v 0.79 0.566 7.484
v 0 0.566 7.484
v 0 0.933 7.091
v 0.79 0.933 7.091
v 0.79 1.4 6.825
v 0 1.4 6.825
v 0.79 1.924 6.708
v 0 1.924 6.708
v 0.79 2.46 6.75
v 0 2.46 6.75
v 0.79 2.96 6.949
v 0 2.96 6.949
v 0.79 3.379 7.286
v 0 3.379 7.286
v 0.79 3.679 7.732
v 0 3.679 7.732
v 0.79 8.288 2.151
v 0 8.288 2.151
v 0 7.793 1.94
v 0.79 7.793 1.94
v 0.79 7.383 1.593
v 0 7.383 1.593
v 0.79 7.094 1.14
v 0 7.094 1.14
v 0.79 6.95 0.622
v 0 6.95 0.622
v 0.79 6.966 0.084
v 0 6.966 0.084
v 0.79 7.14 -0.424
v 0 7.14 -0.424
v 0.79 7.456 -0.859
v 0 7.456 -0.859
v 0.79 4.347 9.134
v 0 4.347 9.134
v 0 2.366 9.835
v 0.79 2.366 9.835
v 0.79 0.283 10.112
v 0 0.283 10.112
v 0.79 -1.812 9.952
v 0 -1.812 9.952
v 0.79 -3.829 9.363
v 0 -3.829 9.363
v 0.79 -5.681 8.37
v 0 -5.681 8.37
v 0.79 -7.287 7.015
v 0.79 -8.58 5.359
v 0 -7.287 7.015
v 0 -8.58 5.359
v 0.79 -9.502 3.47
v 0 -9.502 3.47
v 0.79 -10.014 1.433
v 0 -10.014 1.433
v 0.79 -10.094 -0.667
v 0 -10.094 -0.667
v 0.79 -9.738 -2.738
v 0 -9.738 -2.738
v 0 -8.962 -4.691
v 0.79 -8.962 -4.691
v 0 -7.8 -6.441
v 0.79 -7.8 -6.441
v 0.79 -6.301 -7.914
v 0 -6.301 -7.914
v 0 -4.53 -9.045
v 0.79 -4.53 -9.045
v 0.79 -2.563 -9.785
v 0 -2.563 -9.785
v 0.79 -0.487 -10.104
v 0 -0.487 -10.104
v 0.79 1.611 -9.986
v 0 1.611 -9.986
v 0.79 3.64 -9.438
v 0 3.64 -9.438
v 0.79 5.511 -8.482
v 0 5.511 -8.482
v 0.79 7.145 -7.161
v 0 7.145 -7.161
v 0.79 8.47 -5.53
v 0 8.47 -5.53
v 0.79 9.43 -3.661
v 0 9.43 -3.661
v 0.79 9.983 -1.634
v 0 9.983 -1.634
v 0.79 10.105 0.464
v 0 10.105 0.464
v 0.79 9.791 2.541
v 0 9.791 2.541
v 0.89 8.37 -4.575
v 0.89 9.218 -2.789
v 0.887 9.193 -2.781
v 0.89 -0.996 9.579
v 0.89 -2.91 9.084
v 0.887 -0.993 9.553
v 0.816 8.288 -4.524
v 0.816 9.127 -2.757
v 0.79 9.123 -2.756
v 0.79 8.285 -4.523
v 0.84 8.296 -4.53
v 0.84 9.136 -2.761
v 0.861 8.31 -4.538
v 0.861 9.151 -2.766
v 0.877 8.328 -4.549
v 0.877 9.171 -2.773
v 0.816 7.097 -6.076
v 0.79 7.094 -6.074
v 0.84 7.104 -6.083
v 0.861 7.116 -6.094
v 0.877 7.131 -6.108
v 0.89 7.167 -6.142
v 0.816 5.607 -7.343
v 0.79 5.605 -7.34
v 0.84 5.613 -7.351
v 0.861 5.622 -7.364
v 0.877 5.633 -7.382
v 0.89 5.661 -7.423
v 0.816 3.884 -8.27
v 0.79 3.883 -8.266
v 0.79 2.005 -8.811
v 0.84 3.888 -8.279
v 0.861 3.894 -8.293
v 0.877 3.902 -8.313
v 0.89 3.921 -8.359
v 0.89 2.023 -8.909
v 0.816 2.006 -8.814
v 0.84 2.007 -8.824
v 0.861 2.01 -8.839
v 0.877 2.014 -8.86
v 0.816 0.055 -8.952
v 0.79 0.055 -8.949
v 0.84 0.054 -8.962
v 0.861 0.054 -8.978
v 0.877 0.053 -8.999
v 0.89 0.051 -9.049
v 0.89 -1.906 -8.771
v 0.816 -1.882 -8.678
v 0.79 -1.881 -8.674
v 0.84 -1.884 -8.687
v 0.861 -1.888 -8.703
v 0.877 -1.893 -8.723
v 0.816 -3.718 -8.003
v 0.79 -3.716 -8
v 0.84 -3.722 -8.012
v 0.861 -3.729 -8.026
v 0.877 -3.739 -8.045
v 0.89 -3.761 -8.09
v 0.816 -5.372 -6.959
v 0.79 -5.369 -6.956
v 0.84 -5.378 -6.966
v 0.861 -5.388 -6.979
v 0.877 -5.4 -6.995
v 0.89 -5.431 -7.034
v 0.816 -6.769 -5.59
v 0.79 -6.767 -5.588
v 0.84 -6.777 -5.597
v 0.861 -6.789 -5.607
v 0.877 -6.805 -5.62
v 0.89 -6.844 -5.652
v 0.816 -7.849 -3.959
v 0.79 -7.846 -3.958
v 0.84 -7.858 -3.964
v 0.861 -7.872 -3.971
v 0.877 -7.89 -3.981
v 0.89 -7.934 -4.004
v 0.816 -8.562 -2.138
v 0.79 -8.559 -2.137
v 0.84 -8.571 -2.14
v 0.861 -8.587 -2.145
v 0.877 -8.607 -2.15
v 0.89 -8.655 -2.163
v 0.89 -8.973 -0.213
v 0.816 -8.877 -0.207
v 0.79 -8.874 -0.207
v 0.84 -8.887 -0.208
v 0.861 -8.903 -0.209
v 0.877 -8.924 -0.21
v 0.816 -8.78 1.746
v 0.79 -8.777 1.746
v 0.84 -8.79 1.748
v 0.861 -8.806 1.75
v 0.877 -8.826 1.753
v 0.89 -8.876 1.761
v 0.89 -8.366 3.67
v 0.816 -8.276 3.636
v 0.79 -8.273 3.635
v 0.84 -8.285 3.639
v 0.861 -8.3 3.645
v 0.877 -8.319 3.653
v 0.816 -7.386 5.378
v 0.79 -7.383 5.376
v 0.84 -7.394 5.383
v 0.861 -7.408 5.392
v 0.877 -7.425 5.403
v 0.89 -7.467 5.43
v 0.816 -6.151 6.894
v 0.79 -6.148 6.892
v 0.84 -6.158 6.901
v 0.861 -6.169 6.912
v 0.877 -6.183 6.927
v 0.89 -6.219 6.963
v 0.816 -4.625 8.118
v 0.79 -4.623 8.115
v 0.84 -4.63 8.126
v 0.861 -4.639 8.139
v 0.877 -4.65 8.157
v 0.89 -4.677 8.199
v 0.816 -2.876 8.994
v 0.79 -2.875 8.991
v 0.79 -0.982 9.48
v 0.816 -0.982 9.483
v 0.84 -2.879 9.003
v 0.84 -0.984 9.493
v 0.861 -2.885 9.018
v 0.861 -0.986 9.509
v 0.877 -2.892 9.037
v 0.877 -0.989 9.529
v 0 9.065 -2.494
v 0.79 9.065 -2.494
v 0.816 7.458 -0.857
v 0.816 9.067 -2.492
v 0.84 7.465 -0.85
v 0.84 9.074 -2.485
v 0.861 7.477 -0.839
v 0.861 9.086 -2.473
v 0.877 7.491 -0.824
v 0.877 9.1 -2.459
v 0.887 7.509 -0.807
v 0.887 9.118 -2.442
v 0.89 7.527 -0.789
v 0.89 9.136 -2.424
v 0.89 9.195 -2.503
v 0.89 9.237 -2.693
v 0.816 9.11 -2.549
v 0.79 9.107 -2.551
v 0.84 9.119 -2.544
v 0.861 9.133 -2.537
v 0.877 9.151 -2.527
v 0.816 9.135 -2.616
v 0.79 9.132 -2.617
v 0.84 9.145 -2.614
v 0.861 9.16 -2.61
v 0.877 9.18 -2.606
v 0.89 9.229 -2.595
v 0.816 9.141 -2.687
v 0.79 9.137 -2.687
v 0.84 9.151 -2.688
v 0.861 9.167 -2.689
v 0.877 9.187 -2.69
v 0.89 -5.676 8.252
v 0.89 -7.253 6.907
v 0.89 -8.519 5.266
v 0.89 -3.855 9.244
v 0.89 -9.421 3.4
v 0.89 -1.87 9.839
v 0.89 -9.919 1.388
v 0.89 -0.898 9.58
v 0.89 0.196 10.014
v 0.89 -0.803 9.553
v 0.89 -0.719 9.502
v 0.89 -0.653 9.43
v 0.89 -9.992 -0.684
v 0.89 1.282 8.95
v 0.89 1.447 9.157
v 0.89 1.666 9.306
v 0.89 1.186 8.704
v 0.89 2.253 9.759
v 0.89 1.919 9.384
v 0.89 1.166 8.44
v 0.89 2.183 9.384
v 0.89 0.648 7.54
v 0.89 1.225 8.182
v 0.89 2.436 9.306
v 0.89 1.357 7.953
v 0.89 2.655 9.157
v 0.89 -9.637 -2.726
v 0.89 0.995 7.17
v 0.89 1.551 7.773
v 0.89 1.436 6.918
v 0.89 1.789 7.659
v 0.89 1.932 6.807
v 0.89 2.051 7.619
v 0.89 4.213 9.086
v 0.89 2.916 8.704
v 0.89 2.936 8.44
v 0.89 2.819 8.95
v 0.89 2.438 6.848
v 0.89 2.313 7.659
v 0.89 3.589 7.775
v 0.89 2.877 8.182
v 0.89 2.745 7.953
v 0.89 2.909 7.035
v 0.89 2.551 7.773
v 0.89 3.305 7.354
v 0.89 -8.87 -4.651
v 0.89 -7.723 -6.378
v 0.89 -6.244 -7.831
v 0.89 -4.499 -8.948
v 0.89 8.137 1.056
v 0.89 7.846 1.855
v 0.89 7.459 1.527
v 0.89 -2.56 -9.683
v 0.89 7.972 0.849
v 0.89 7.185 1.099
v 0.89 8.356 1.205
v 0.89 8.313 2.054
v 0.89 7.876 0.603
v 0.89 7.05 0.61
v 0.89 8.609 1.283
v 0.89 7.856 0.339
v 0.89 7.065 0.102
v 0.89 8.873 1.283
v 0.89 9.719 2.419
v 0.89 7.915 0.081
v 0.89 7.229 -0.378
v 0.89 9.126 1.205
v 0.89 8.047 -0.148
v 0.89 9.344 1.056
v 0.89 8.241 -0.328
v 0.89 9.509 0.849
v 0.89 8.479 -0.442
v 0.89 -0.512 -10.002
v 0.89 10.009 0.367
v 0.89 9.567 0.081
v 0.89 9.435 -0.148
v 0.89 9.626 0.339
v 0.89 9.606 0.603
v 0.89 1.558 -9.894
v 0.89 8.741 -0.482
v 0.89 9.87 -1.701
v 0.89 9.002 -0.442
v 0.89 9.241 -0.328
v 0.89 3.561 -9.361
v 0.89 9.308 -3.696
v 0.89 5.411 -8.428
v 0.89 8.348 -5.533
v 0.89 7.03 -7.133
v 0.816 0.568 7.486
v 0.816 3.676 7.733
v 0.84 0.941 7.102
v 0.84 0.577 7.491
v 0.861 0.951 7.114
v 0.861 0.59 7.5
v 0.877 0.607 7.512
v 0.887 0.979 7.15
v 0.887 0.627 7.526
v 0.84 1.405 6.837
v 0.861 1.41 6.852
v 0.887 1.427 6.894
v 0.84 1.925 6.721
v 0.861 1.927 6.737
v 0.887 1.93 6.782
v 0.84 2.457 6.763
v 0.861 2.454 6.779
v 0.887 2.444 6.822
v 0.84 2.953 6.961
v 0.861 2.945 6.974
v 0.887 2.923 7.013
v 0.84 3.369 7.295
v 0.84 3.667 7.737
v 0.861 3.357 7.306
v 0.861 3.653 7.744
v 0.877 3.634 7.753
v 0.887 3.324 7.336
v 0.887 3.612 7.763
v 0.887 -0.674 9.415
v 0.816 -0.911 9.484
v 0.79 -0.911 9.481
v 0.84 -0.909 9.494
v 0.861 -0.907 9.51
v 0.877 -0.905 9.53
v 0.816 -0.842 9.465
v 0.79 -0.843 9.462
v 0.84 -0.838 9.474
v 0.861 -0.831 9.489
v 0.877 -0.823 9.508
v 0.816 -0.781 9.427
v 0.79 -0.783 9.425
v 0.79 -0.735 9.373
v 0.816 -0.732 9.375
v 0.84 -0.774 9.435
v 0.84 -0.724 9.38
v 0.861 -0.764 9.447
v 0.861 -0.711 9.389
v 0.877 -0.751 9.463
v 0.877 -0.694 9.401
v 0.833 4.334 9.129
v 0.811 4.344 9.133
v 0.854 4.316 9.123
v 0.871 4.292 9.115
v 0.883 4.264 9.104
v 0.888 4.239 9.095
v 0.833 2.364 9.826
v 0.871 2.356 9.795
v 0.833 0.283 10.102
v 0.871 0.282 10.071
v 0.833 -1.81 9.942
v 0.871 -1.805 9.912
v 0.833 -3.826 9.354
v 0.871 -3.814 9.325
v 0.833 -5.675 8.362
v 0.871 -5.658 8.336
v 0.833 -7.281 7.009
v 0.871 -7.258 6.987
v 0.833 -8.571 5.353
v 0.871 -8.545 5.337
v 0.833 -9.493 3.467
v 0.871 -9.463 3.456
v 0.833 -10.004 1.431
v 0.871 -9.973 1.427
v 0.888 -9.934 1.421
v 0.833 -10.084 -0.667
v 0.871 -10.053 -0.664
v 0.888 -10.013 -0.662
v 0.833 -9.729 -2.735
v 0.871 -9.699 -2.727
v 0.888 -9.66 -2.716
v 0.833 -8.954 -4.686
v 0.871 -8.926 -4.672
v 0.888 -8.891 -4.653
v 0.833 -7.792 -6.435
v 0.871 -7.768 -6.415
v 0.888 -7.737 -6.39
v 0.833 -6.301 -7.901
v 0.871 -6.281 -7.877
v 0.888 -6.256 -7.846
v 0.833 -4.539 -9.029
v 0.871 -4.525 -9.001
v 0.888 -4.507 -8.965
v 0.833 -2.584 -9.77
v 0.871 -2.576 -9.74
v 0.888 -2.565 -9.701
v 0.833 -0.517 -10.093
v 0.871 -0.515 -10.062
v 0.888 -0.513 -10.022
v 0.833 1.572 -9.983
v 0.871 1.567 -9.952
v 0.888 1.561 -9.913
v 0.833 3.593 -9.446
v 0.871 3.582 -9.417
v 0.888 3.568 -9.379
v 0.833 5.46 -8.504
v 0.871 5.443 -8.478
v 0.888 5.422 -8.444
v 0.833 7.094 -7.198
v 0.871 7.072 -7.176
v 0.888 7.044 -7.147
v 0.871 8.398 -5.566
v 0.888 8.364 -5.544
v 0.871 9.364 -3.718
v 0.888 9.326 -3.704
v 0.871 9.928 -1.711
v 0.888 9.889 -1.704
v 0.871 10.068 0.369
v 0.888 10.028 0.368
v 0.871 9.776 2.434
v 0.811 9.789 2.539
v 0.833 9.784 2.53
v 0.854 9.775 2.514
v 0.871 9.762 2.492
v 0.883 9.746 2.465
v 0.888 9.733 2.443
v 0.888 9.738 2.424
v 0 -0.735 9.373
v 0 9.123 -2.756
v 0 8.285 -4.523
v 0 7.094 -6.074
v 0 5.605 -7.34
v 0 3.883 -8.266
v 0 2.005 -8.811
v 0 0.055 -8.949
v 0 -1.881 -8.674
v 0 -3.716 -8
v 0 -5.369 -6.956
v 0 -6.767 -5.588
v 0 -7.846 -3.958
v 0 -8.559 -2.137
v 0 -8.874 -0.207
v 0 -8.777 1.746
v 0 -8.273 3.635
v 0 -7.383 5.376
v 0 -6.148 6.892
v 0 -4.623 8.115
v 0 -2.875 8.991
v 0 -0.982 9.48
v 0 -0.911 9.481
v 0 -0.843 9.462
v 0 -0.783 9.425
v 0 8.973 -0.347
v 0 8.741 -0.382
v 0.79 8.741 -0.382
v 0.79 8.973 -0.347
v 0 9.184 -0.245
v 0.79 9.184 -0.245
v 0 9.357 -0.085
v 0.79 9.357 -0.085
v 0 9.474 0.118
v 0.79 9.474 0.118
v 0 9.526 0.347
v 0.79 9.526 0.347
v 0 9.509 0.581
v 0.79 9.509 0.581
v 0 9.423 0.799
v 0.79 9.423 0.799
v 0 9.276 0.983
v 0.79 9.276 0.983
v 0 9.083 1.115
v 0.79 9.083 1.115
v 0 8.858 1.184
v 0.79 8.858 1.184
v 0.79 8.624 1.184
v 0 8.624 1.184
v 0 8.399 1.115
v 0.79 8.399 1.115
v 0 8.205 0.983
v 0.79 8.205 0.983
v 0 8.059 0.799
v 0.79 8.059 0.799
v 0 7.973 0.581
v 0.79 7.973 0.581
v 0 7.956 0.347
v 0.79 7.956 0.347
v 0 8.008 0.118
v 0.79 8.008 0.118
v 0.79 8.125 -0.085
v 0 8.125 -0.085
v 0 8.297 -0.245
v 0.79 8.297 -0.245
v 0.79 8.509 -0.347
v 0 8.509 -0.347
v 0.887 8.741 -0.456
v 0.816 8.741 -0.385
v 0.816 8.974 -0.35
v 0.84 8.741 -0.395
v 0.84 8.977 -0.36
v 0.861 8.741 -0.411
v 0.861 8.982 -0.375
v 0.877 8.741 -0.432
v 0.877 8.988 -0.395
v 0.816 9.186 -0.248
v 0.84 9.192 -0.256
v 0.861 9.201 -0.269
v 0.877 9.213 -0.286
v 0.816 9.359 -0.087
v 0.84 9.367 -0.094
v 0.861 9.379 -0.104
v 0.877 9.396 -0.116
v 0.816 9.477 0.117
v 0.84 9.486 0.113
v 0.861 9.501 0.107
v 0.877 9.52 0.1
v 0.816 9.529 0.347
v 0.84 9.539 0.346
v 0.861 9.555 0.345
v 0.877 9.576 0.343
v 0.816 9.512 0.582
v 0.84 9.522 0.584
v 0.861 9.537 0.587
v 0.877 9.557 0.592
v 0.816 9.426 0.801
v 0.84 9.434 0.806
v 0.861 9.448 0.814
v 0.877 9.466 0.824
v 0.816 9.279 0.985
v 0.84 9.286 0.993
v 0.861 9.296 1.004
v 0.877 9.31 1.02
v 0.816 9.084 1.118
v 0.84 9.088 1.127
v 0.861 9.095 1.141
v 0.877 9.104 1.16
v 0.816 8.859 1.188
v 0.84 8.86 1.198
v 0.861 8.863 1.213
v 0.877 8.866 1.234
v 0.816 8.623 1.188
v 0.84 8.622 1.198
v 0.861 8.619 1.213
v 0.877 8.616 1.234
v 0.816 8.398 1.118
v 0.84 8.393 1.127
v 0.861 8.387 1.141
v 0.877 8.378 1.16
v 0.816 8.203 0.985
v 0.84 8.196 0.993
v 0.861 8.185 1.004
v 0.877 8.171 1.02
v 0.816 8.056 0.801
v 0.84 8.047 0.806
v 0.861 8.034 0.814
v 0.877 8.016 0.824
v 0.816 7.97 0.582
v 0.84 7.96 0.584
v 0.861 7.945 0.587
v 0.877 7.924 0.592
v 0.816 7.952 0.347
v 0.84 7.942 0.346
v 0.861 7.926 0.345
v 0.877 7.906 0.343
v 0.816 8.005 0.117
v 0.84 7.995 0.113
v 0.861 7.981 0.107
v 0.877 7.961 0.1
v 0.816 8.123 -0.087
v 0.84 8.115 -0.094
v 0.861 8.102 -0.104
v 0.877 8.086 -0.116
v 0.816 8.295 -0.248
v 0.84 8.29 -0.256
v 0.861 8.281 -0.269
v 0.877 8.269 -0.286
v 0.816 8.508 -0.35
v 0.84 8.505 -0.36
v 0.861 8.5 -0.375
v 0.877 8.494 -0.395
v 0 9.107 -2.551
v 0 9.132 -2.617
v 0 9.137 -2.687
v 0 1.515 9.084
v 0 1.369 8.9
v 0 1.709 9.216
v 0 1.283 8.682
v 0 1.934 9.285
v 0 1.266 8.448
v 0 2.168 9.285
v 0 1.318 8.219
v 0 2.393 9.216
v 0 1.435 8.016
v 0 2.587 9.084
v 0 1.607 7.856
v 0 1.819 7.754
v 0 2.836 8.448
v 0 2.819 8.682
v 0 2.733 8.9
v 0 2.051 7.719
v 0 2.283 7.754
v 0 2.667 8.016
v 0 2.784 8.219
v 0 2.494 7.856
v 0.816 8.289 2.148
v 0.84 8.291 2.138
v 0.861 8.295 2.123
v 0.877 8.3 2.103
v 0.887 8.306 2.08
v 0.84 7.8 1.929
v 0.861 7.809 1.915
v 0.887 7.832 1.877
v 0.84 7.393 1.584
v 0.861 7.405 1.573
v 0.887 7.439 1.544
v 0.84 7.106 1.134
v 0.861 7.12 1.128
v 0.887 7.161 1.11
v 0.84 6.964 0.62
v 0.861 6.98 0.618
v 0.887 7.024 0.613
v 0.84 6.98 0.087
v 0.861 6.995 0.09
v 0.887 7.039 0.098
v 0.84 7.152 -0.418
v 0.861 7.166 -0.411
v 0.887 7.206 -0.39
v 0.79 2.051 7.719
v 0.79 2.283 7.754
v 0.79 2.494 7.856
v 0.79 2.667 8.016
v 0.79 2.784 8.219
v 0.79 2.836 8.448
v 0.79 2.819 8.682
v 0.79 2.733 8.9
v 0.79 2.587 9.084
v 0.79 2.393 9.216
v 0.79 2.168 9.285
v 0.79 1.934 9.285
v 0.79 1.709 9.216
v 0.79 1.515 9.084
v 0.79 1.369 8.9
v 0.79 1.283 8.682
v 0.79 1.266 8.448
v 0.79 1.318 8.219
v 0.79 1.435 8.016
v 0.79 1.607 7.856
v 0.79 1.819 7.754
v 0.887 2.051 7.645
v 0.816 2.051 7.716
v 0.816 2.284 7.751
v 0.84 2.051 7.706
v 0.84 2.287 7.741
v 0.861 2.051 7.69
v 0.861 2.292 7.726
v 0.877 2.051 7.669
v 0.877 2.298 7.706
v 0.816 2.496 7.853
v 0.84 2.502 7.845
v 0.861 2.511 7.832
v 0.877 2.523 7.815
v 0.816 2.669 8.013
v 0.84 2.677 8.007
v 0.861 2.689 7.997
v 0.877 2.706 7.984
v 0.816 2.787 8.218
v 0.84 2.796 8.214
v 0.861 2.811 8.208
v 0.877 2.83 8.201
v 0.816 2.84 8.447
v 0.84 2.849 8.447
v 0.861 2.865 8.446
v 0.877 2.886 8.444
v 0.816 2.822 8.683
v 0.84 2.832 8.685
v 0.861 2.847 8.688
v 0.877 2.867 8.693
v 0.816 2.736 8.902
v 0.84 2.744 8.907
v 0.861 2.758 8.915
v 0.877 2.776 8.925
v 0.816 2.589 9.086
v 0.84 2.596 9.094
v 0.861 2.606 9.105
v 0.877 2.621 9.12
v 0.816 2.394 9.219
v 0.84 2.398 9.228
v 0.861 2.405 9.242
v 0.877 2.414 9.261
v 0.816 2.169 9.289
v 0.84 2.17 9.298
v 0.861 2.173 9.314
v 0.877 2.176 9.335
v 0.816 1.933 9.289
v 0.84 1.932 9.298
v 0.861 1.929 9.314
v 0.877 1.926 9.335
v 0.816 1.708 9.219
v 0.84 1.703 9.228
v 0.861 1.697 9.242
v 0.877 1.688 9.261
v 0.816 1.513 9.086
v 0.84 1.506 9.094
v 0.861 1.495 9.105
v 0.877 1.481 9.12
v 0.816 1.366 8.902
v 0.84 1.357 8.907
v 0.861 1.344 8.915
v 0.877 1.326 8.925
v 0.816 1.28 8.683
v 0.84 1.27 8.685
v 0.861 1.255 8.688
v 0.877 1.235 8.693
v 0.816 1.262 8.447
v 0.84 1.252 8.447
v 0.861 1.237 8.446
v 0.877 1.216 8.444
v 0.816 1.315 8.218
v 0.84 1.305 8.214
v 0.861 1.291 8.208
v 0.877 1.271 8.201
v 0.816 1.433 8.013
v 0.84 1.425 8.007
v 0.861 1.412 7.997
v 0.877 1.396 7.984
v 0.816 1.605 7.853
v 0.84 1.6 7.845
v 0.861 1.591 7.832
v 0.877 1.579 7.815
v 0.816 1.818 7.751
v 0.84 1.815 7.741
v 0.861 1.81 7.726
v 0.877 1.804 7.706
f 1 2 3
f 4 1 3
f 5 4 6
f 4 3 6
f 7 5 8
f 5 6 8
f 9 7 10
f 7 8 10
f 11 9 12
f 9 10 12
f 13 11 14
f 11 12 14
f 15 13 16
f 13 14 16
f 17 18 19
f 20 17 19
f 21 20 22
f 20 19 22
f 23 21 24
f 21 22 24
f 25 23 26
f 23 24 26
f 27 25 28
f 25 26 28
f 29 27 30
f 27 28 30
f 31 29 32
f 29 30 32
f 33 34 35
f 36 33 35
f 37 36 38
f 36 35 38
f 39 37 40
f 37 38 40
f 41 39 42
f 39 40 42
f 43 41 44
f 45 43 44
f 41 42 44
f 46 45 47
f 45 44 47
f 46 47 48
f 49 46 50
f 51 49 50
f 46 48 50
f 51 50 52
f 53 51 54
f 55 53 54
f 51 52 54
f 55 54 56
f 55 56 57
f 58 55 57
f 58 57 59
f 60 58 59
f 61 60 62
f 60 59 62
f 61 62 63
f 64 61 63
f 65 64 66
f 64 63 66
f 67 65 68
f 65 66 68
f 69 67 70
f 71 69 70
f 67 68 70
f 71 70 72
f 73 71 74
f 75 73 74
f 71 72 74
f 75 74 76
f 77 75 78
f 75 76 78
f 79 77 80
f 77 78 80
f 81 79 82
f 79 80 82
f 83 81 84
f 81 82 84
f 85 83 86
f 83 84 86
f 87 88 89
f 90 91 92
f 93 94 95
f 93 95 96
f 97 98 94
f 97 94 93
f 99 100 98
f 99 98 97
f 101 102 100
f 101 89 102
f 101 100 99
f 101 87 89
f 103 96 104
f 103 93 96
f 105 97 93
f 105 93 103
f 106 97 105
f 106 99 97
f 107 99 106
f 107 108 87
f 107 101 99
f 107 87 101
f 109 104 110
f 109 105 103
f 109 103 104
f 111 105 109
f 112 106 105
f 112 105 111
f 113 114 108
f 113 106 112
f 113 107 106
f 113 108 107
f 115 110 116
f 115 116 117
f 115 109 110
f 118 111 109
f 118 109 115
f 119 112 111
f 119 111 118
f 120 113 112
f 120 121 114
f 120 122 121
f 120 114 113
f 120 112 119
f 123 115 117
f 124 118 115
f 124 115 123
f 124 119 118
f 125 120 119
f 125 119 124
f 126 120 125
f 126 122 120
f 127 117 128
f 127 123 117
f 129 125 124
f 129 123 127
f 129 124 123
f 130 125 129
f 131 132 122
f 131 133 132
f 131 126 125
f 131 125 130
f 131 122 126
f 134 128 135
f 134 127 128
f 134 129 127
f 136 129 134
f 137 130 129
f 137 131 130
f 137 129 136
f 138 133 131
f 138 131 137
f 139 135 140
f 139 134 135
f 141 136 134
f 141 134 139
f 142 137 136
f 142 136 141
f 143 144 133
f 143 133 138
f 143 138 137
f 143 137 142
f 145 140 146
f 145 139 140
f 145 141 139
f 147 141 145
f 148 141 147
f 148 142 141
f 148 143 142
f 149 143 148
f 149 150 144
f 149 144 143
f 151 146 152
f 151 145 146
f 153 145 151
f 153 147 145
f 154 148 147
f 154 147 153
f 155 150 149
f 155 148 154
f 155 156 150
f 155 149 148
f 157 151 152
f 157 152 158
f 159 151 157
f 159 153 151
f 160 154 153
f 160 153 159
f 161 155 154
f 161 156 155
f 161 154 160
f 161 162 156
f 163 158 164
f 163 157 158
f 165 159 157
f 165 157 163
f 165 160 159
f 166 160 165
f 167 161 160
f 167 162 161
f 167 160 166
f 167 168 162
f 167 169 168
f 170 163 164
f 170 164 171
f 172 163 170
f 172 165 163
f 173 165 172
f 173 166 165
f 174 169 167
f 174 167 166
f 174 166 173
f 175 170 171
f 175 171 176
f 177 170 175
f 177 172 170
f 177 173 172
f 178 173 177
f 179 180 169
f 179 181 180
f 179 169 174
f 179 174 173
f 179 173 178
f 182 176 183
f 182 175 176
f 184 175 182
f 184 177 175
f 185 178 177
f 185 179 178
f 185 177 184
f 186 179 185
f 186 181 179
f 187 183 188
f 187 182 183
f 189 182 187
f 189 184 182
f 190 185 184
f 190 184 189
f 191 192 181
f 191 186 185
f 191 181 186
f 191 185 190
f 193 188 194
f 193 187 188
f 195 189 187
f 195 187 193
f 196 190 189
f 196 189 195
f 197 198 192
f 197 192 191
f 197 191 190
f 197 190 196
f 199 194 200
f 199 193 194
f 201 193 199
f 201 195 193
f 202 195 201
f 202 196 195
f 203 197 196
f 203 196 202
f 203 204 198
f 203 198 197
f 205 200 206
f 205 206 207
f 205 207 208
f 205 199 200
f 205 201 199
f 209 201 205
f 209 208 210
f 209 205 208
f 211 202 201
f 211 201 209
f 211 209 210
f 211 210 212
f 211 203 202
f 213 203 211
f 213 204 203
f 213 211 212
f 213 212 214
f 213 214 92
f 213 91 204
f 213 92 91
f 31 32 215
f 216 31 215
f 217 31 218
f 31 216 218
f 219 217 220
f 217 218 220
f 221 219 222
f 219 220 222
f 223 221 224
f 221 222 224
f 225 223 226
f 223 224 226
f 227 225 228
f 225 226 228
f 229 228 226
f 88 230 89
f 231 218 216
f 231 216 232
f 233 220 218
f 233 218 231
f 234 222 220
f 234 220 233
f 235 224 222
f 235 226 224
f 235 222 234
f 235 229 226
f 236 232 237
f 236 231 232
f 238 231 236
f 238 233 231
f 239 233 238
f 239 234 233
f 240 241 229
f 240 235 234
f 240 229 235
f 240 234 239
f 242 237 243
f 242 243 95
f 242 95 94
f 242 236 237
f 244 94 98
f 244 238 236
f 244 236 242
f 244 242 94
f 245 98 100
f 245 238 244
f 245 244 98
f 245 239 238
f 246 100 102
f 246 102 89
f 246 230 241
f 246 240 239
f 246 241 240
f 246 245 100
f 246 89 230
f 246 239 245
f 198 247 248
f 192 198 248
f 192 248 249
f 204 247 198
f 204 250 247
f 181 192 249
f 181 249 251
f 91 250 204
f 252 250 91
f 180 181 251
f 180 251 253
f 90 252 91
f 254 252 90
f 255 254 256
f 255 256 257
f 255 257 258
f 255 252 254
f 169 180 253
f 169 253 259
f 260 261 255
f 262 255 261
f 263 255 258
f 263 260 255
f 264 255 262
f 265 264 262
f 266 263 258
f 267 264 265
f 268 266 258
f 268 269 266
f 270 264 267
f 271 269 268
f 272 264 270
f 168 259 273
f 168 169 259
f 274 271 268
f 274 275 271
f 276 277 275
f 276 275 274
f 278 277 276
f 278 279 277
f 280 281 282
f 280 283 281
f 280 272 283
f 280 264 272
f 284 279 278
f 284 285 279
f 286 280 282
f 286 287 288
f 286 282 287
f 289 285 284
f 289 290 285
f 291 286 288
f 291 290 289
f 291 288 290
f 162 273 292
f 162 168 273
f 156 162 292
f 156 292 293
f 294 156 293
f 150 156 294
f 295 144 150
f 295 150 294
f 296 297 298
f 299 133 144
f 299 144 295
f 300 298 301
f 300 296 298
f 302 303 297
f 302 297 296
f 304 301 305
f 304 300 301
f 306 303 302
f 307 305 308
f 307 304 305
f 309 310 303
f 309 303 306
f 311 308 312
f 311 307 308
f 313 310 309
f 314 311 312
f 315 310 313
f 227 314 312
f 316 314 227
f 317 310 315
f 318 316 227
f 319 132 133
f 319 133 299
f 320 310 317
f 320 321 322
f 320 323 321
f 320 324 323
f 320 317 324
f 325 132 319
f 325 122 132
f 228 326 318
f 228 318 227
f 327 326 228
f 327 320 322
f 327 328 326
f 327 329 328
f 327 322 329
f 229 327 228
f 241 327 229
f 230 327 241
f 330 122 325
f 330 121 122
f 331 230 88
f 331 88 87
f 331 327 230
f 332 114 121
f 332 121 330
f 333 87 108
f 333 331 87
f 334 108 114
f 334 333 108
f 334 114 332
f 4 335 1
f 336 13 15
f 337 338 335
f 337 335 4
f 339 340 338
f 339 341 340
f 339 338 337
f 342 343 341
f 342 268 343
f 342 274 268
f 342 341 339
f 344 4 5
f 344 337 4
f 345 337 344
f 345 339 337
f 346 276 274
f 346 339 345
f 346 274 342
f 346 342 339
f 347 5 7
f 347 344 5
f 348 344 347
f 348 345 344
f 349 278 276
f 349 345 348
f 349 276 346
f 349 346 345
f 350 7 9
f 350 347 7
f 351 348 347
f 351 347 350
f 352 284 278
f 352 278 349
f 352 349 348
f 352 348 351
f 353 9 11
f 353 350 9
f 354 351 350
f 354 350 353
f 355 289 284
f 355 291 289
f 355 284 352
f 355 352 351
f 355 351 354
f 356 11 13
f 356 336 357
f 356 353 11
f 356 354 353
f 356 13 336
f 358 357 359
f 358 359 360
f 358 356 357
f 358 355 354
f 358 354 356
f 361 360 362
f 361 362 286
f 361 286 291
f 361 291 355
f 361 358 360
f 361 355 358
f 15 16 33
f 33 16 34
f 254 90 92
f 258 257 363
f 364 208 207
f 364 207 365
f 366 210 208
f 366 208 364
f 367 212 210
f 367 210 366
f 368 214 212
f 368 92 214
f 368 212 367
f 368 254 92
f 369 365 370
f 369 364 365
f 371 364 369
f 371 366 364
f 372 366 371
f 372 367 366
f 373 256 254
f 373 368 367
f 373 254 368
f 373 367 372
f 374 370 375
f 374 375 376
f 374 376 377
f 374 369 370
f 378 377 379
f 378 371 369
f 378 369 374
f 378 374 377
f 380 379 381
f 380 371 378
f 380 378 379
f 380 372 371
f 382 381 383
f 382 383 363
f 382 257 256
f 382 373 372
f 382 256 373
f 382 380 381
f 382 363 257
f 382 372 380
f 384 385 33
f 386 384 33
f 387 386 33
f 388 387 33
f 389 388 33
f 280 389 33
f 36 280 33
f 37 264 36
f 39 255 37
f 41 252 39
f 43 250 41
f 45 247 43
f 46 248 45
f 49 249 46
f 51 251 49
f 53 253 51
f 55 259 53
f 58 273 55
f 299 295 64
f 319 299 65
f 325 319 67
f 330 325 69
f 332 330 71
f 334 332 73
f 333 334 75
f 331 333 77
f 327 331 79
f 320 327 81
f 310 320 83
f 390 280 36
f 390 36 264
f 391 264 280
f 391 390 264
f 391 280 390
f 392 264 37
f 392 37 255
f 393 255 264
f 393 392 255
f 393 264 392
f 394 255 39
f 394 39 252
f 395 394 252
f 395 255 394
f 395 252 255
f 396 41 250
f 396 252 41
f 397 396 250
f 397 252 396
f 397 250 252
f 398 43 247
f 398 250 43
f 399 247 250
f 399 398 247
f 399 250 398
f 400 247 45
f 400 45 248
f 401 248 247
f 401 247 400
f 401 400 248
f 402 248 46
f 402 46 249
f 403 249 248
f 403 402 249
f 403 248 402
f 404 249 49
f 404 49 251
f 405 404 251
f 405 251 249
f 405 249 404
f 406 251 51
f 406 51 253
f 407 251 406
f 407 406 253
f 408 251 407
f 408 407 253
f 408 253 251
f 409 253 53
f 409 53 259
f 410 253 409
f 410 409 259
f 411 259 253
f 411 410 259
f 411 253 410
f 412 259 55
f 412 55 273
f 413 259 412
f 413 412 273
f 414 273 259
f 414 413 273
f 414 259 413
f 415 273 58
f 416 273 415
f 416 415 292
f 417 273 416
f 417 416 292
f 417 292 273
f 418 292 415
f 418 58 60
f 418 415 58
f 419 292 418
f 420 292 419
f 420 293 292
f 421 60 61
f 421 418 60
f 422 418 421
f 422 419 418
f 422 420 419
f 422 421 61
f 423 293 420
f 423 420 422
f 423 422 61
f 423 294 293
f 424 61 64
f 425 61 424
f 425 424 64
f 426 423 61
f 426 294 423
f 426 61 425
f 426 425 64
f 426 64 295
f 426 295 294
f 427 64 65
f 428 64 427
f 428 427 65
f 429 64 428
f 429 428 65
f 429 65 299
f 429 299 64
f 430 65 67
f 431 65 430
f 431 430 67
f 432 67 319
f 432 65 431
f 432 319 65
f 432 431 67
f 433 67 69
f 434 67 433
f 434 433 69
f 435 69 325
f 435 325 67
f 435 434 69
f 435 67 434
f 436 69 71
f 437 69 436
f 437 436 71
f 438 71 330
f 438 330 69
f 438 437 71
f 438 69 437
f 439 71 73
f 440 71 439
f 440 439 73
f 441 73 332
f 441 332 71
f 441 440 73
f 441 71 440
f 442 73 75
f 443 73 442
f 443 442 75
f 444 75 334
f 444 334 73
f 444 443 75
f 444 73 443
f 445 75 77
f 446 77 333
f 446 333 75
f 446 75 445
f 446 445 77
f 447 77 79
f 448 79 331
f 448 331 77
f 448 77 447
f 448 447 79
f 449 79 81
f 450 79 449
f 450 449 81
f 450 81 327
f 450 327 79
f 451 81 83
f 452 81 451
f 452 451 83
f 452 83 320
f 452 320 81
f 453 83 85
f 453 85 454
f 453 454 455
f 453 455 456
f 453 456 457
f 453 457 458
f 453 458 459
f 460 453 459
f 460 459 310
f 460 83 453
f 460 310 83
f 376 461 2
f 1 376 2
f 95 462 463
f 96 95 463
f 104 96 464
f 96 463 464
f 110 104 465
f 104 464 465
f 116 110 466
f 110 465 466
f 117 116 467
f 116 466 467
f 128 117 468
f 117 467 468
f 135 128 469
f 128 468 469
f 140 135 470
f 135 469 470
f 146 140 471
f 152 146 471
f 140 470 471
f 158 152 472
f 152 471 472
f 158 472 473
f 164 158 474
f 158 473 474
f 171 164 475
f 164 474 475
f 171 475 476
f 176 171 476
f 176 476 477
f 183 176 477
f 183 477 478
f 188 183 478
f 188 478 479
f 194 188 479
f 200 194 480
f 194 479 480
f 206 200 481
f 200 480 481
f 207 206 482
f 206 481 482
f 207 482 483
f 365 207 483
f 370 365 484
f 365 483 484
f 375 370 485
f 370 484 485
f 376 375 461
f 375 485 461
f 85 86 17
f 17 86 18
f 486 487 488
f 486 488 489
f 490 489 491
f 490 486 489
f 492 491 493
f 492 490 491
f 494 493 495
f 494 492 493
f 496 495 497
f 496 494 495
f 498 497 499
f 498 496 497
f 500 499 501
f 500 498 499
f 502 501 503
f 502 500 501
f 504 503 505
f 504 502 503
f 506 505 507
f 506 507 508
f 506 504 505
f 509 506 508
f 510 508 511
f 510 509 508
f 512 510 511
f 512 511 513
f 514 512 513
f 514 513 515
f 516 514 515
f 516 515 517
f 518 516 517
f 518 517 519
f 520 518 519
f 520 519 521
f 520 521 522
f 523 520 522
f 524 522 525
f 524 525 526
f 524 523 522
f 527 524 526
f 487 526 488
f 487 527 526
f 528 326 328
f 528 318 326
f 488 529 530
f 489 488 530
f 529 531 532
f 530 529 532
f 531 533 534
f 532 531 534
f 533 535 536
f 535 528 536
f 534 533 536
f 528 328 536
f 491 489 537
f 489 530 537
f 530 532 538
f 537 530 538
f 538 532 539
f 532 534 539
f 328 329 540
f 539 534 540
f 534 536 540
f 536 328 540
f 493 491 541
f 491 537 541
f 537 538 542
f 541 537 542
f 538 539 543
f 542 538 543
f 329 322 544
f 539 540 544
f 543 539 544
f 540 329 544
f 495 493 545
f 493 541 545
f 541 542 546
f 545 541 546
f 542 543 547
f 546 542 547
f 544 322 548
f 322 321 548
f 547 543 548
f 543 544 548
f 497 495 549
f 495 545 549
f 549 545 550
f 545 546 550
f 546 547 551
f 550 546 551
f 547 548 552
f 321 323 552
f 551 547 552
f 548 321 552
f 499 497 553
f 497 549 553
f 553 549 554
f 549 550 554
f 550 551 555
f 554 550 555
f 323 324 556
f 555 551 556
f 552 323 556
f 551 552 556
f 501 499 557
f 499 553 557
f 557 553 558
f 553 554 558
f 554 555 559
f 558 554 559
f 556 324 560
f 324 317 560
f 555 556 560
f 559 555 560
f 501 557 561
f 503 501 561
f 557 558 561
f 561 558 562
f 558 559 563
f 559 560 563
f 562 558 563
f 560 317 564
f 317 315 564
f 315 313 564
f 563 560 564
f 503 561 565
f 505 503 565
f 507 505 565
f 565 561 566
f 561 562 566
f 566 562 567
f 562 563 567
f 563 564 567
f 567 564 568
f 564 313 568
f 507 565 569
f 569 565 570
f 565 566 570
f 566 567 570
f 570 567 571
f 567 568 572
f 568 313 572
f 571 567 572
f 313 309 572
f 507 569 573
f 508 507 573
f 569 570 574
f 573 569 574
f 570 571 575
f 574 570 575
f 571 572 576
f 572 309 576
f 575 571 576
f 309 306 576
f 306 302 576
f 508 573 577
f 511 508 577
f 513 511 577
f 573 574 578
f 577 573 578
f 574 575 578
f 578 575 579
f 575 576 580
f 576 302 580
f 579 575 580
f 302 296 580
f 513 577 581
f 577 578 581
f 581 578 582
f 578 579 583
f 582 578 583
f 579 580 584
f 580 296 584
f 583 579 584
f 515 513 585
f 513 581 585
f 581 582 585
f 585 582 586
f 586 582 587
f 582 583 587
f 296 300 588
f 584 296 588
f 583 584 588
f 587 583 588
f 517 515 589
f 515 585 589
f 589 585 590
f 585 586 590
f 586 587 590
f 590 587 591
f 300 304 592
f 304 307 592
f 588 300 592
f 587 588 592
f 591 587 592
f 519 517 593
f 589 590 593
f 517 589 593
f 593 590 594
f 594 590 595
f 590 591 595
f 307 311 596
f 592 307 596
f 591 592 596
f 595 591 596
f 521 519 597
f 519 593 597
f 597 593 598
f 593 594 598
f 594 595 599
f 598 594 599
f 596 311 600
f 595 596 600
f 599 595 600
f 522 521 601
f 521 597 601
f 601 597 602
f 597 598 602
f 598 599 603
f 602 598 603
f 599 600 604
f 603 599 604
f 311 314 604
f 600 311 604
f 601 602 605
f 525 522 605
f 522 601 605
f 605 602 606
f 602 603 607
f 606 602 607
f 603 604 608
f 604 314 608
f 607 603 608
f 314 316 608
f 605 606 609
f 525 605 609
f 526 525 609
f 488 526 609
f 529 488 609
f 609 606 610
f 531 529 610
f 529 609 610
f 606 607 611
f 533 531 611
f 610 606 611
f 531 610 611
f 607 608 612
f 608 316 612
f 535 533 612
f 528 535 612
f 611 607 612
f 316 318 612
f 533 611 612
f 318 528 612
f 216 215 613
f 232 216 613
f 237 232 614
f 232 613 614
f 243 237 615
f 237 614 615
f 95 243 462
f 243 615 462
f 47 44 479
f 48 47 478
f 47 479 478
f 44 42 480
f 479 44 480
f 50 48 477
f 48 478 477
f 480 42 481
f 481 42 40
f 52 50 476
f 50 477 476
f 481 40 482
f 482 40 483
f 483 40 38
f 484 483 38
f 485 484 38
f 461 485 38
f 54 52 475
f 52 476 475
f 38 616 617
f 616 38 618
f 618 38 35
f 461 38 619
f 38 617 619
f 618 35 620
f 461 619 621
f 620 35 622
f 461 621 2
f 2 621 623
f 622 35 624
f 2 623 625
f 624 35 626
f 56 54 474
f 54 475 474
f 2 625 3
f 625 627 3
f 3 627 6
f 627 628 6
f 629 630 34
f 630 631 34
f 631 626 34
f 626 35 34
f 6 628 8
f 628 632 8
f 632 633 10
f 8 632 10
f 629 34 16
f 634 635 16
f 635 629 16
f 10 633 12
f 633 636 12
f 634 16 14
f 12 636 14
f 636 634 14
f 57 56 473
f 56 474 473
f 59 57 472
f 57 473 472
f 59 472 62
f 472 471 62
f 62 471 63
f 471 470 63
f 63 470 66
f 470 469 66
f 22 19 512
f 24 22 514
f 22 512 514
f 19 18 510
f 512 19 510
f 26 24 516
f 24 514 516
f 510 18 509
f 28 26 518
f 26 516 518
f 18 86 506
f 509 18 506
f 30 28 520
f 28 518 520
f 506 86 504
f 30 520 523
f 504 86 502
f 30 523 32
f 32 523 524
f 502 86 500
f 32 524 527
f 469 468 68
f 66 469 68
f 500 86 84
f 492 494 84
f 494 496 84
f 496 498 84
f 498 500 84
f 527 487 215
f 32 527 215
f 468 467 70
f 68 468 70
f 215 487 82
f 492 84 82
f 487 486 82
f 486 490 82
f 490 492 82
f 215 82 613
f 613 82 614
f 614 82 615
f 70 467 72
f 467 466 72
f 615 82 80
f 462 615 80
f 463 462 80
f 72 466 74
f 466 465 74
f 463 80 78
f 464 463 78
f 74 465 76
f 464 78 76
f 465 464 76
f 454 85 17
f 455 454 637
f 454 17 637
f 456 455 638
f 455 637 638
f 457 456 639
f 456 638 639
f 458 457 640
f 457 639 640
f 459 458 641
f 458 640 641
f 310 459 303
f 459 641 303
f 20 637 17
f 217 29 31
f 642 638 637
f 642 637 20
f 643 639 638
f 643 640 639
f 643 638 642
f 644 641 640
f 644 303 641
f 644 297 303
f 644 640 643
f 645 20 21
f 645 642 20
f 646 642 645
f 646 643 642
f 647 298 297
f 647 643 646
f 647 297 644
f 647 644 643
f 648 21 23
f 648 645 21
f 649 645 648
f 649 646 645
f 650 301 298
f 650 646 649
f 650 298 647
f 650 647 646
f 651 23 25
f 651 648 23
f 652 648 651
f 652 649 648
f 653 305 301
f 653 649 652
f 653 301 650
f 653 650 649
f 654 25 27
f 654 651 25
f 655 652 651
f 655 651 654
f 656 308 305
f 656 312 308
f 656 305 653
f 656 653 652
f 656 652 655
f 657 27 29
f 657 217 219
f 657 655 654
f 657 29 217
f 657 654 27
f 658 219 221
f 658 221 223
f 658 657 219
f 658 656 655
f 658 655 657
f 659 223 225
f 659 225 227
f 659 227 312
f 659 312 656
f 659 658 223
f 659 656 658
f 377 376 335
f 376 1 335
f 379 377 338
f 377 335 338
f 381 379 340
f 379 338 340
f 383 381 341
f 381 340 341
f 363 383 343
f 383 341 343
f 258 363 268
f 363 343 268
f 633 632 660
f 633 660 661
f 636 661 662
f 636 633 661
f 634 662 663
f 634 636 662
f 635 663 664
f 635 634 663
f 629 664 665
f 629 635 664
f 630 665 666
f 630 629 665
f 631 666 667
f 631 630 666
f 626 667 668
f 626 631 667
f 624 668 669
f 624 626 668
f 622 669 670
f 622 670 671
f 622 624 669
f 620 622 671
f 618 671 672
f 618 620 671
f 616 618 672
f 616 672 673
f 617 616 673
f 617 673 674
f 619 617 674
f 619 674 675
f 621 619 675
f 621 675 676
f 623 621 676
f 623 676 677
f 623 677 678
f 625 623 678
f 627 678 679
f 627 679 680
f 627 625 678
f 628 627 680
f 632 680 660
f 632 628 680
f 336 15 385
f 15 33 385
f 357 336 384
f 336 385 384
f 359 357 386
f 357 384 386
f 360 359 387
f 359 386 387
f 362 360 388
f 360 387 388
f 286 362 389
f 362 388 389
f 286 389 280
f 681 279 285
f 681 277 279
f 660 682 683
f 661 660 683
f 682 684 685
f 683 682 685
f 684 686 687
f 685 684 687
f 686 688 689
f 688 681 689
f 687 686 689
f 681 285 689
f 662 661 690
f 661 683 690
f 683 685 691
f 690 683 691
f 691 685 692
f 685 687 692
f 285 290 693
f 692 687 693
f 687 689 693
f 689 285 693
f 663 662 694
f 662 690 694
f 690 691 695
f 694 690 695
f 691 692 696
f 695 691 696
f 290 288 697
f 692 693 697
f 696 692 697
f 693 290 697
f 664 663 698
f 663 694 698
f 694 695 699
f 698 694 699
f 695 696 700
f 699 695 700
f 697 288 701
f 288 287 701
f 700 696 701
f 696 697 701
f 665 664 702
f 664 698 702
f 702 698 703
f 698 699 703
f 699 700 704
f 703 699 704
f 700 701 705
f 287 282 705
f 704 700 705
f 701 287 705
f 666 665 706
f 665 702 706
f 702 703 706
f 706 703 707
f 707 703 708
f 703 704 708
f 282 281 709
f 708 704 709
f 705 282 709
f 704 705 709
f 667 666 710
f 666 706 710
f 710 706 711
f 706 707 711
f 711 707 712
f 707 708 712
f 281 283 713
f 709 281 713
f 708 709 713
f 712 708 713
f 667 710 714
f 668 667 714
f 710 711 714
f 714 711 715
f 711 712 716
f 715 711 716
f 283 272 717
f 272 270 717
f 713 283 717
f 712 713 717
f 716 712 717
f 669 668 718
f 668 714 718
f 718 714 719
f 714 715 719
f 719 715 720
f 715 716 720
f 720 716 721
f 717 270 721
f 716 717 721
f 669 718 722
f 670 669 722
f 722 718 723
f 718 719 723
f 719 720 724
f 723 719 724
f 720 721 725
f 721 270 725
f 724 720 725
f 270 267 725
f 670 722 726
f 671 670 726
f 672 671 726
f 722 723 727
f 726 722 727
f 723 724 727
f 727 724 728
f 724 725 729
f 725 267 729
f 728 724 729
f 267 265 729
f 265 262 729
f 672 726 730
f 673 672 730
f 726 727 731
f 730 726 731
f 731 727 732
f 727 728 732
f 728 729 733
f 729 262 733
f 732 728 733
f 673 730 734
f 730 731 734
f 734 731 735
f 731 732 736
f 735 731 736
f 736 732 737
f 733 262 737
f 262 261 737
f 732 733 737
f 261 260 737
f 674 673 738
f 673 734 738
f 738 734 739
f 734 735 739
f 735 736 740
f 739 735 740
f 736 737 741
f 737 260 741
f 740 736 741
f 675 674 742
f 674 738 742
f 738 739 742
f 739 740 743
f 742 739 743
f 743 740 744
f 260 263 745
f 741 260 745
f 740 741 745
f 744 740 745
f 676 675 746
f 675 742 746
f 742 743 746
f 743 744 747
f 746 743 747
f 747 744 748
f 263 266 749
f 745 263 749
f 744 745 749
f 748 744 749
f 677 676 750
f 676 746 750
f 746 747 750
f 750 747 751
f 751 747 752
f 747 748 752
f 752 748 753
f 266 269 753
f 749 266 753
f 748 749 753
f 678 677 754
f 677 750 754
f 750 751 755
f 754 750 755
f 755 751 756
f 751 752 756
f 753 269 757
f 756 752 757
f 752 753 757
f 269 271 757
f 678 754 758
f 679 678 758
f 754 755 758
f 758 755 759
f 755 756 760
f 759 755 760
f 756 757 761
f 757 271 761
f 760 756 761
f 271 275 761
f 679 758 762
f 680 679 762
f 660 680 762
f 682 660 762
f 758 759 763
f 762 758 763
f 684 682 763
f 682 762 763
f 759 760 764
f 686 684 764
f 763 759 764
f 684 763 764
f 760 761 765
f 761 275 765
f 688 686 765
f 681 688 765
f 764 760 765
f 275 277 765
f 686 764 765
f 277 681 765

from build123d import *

# Parameters (mm, degrees)
SKETCH1_R           = 0.7874
BOSS_EXTRUDE1_DEPTH = 0.89
FILLET1_R           = 0.1


with BuildPart() as part:
    # Sketch1 → Boss-Extrude1 (new body)
    with BuildSketch(Plane(origin=(0, 0, 0), x_dir=(0, 0, -1), z_dir=(1, 0, 0))):
        with BuildLine():
            Line((-9.372828774, -0.73517355), (-7.483771729, 0.565616411))
            ThreePointArc((-7.483771729, 0.565616411), (-6.708837054, 2.194029076), (-7.731616452, 3.679348524))
            Line((-7.731616452, 3.679348524), (-9.134018919, 4.346728677))
            ThreePointArc((-9.134018919, 4.346728677), (6.441225552, -7.799677249), (-2.541446831, 9.791087775))
            Line((-2.541446831, 9.791087775), (-2.151242771, 8.287801467))
            ThreePointArc((-2.151242771, 8.287801467), (-0.886078684, 7.002651136), (0.859476194, 7.45574021))
            Line((0.859476194, 7.45574021), (2.493954423, 9.06479955))
            ThreePointArc((2.493954423, 9.06479955), (2.616717918, 9.131670791), (2.756271382, 9.123456835))
            ThreePointArc((2.756271382, 9.123456835), (5.588056342, -6.766575002), (-9.480022186, -0.981669875))
            ThreePointArc((-9.480022186, -0.981669875), (-9.461703842, -0.843080275), (-9.372828774, -0.73517355))
        make_face()
        with Locations((-8.506551123, 2.050935853)):
            Circle(SKETCH1_R, mode=Mode.SUBTRACT)
        with Locations((-0.405687887, 8.740890535)):
            Circle(SKETCH1_R, mode=Mode.SUBTRACT)
    extrude(amount=BOSS_EXTRUDE1_DEPTH)

    # Fillet1
    fillet1_edges = [part.edges().sort_by_distance(p)[0] for p in [
        (0.89, 2.194029076, 6.708837054),
        (0.89, 4.0130386, 8.432817685),
        (0.89, -7.799677249, -6.441225552),
        (0.89, 9.039444621, 2.346344801),
        (0.89, 2.050935853, 9.293951123),
        (0.89, 7.002651136, 0.886078684),
        (0.89, 8.740890535, 1.193087887),
        (0.89, 8.26026988, -1.676715309),
        (0.89, 9.131670791, -2.616717918),
        (0.89, -6.766575002, -5.588056342),
        (0.89, -0.843080275, 9.461703842),
        (0.89, -0.08477857, 8.428300251),
    ]]
    fillet(fillet1_edges, radius=FILLET1_R)


solid = part.part
